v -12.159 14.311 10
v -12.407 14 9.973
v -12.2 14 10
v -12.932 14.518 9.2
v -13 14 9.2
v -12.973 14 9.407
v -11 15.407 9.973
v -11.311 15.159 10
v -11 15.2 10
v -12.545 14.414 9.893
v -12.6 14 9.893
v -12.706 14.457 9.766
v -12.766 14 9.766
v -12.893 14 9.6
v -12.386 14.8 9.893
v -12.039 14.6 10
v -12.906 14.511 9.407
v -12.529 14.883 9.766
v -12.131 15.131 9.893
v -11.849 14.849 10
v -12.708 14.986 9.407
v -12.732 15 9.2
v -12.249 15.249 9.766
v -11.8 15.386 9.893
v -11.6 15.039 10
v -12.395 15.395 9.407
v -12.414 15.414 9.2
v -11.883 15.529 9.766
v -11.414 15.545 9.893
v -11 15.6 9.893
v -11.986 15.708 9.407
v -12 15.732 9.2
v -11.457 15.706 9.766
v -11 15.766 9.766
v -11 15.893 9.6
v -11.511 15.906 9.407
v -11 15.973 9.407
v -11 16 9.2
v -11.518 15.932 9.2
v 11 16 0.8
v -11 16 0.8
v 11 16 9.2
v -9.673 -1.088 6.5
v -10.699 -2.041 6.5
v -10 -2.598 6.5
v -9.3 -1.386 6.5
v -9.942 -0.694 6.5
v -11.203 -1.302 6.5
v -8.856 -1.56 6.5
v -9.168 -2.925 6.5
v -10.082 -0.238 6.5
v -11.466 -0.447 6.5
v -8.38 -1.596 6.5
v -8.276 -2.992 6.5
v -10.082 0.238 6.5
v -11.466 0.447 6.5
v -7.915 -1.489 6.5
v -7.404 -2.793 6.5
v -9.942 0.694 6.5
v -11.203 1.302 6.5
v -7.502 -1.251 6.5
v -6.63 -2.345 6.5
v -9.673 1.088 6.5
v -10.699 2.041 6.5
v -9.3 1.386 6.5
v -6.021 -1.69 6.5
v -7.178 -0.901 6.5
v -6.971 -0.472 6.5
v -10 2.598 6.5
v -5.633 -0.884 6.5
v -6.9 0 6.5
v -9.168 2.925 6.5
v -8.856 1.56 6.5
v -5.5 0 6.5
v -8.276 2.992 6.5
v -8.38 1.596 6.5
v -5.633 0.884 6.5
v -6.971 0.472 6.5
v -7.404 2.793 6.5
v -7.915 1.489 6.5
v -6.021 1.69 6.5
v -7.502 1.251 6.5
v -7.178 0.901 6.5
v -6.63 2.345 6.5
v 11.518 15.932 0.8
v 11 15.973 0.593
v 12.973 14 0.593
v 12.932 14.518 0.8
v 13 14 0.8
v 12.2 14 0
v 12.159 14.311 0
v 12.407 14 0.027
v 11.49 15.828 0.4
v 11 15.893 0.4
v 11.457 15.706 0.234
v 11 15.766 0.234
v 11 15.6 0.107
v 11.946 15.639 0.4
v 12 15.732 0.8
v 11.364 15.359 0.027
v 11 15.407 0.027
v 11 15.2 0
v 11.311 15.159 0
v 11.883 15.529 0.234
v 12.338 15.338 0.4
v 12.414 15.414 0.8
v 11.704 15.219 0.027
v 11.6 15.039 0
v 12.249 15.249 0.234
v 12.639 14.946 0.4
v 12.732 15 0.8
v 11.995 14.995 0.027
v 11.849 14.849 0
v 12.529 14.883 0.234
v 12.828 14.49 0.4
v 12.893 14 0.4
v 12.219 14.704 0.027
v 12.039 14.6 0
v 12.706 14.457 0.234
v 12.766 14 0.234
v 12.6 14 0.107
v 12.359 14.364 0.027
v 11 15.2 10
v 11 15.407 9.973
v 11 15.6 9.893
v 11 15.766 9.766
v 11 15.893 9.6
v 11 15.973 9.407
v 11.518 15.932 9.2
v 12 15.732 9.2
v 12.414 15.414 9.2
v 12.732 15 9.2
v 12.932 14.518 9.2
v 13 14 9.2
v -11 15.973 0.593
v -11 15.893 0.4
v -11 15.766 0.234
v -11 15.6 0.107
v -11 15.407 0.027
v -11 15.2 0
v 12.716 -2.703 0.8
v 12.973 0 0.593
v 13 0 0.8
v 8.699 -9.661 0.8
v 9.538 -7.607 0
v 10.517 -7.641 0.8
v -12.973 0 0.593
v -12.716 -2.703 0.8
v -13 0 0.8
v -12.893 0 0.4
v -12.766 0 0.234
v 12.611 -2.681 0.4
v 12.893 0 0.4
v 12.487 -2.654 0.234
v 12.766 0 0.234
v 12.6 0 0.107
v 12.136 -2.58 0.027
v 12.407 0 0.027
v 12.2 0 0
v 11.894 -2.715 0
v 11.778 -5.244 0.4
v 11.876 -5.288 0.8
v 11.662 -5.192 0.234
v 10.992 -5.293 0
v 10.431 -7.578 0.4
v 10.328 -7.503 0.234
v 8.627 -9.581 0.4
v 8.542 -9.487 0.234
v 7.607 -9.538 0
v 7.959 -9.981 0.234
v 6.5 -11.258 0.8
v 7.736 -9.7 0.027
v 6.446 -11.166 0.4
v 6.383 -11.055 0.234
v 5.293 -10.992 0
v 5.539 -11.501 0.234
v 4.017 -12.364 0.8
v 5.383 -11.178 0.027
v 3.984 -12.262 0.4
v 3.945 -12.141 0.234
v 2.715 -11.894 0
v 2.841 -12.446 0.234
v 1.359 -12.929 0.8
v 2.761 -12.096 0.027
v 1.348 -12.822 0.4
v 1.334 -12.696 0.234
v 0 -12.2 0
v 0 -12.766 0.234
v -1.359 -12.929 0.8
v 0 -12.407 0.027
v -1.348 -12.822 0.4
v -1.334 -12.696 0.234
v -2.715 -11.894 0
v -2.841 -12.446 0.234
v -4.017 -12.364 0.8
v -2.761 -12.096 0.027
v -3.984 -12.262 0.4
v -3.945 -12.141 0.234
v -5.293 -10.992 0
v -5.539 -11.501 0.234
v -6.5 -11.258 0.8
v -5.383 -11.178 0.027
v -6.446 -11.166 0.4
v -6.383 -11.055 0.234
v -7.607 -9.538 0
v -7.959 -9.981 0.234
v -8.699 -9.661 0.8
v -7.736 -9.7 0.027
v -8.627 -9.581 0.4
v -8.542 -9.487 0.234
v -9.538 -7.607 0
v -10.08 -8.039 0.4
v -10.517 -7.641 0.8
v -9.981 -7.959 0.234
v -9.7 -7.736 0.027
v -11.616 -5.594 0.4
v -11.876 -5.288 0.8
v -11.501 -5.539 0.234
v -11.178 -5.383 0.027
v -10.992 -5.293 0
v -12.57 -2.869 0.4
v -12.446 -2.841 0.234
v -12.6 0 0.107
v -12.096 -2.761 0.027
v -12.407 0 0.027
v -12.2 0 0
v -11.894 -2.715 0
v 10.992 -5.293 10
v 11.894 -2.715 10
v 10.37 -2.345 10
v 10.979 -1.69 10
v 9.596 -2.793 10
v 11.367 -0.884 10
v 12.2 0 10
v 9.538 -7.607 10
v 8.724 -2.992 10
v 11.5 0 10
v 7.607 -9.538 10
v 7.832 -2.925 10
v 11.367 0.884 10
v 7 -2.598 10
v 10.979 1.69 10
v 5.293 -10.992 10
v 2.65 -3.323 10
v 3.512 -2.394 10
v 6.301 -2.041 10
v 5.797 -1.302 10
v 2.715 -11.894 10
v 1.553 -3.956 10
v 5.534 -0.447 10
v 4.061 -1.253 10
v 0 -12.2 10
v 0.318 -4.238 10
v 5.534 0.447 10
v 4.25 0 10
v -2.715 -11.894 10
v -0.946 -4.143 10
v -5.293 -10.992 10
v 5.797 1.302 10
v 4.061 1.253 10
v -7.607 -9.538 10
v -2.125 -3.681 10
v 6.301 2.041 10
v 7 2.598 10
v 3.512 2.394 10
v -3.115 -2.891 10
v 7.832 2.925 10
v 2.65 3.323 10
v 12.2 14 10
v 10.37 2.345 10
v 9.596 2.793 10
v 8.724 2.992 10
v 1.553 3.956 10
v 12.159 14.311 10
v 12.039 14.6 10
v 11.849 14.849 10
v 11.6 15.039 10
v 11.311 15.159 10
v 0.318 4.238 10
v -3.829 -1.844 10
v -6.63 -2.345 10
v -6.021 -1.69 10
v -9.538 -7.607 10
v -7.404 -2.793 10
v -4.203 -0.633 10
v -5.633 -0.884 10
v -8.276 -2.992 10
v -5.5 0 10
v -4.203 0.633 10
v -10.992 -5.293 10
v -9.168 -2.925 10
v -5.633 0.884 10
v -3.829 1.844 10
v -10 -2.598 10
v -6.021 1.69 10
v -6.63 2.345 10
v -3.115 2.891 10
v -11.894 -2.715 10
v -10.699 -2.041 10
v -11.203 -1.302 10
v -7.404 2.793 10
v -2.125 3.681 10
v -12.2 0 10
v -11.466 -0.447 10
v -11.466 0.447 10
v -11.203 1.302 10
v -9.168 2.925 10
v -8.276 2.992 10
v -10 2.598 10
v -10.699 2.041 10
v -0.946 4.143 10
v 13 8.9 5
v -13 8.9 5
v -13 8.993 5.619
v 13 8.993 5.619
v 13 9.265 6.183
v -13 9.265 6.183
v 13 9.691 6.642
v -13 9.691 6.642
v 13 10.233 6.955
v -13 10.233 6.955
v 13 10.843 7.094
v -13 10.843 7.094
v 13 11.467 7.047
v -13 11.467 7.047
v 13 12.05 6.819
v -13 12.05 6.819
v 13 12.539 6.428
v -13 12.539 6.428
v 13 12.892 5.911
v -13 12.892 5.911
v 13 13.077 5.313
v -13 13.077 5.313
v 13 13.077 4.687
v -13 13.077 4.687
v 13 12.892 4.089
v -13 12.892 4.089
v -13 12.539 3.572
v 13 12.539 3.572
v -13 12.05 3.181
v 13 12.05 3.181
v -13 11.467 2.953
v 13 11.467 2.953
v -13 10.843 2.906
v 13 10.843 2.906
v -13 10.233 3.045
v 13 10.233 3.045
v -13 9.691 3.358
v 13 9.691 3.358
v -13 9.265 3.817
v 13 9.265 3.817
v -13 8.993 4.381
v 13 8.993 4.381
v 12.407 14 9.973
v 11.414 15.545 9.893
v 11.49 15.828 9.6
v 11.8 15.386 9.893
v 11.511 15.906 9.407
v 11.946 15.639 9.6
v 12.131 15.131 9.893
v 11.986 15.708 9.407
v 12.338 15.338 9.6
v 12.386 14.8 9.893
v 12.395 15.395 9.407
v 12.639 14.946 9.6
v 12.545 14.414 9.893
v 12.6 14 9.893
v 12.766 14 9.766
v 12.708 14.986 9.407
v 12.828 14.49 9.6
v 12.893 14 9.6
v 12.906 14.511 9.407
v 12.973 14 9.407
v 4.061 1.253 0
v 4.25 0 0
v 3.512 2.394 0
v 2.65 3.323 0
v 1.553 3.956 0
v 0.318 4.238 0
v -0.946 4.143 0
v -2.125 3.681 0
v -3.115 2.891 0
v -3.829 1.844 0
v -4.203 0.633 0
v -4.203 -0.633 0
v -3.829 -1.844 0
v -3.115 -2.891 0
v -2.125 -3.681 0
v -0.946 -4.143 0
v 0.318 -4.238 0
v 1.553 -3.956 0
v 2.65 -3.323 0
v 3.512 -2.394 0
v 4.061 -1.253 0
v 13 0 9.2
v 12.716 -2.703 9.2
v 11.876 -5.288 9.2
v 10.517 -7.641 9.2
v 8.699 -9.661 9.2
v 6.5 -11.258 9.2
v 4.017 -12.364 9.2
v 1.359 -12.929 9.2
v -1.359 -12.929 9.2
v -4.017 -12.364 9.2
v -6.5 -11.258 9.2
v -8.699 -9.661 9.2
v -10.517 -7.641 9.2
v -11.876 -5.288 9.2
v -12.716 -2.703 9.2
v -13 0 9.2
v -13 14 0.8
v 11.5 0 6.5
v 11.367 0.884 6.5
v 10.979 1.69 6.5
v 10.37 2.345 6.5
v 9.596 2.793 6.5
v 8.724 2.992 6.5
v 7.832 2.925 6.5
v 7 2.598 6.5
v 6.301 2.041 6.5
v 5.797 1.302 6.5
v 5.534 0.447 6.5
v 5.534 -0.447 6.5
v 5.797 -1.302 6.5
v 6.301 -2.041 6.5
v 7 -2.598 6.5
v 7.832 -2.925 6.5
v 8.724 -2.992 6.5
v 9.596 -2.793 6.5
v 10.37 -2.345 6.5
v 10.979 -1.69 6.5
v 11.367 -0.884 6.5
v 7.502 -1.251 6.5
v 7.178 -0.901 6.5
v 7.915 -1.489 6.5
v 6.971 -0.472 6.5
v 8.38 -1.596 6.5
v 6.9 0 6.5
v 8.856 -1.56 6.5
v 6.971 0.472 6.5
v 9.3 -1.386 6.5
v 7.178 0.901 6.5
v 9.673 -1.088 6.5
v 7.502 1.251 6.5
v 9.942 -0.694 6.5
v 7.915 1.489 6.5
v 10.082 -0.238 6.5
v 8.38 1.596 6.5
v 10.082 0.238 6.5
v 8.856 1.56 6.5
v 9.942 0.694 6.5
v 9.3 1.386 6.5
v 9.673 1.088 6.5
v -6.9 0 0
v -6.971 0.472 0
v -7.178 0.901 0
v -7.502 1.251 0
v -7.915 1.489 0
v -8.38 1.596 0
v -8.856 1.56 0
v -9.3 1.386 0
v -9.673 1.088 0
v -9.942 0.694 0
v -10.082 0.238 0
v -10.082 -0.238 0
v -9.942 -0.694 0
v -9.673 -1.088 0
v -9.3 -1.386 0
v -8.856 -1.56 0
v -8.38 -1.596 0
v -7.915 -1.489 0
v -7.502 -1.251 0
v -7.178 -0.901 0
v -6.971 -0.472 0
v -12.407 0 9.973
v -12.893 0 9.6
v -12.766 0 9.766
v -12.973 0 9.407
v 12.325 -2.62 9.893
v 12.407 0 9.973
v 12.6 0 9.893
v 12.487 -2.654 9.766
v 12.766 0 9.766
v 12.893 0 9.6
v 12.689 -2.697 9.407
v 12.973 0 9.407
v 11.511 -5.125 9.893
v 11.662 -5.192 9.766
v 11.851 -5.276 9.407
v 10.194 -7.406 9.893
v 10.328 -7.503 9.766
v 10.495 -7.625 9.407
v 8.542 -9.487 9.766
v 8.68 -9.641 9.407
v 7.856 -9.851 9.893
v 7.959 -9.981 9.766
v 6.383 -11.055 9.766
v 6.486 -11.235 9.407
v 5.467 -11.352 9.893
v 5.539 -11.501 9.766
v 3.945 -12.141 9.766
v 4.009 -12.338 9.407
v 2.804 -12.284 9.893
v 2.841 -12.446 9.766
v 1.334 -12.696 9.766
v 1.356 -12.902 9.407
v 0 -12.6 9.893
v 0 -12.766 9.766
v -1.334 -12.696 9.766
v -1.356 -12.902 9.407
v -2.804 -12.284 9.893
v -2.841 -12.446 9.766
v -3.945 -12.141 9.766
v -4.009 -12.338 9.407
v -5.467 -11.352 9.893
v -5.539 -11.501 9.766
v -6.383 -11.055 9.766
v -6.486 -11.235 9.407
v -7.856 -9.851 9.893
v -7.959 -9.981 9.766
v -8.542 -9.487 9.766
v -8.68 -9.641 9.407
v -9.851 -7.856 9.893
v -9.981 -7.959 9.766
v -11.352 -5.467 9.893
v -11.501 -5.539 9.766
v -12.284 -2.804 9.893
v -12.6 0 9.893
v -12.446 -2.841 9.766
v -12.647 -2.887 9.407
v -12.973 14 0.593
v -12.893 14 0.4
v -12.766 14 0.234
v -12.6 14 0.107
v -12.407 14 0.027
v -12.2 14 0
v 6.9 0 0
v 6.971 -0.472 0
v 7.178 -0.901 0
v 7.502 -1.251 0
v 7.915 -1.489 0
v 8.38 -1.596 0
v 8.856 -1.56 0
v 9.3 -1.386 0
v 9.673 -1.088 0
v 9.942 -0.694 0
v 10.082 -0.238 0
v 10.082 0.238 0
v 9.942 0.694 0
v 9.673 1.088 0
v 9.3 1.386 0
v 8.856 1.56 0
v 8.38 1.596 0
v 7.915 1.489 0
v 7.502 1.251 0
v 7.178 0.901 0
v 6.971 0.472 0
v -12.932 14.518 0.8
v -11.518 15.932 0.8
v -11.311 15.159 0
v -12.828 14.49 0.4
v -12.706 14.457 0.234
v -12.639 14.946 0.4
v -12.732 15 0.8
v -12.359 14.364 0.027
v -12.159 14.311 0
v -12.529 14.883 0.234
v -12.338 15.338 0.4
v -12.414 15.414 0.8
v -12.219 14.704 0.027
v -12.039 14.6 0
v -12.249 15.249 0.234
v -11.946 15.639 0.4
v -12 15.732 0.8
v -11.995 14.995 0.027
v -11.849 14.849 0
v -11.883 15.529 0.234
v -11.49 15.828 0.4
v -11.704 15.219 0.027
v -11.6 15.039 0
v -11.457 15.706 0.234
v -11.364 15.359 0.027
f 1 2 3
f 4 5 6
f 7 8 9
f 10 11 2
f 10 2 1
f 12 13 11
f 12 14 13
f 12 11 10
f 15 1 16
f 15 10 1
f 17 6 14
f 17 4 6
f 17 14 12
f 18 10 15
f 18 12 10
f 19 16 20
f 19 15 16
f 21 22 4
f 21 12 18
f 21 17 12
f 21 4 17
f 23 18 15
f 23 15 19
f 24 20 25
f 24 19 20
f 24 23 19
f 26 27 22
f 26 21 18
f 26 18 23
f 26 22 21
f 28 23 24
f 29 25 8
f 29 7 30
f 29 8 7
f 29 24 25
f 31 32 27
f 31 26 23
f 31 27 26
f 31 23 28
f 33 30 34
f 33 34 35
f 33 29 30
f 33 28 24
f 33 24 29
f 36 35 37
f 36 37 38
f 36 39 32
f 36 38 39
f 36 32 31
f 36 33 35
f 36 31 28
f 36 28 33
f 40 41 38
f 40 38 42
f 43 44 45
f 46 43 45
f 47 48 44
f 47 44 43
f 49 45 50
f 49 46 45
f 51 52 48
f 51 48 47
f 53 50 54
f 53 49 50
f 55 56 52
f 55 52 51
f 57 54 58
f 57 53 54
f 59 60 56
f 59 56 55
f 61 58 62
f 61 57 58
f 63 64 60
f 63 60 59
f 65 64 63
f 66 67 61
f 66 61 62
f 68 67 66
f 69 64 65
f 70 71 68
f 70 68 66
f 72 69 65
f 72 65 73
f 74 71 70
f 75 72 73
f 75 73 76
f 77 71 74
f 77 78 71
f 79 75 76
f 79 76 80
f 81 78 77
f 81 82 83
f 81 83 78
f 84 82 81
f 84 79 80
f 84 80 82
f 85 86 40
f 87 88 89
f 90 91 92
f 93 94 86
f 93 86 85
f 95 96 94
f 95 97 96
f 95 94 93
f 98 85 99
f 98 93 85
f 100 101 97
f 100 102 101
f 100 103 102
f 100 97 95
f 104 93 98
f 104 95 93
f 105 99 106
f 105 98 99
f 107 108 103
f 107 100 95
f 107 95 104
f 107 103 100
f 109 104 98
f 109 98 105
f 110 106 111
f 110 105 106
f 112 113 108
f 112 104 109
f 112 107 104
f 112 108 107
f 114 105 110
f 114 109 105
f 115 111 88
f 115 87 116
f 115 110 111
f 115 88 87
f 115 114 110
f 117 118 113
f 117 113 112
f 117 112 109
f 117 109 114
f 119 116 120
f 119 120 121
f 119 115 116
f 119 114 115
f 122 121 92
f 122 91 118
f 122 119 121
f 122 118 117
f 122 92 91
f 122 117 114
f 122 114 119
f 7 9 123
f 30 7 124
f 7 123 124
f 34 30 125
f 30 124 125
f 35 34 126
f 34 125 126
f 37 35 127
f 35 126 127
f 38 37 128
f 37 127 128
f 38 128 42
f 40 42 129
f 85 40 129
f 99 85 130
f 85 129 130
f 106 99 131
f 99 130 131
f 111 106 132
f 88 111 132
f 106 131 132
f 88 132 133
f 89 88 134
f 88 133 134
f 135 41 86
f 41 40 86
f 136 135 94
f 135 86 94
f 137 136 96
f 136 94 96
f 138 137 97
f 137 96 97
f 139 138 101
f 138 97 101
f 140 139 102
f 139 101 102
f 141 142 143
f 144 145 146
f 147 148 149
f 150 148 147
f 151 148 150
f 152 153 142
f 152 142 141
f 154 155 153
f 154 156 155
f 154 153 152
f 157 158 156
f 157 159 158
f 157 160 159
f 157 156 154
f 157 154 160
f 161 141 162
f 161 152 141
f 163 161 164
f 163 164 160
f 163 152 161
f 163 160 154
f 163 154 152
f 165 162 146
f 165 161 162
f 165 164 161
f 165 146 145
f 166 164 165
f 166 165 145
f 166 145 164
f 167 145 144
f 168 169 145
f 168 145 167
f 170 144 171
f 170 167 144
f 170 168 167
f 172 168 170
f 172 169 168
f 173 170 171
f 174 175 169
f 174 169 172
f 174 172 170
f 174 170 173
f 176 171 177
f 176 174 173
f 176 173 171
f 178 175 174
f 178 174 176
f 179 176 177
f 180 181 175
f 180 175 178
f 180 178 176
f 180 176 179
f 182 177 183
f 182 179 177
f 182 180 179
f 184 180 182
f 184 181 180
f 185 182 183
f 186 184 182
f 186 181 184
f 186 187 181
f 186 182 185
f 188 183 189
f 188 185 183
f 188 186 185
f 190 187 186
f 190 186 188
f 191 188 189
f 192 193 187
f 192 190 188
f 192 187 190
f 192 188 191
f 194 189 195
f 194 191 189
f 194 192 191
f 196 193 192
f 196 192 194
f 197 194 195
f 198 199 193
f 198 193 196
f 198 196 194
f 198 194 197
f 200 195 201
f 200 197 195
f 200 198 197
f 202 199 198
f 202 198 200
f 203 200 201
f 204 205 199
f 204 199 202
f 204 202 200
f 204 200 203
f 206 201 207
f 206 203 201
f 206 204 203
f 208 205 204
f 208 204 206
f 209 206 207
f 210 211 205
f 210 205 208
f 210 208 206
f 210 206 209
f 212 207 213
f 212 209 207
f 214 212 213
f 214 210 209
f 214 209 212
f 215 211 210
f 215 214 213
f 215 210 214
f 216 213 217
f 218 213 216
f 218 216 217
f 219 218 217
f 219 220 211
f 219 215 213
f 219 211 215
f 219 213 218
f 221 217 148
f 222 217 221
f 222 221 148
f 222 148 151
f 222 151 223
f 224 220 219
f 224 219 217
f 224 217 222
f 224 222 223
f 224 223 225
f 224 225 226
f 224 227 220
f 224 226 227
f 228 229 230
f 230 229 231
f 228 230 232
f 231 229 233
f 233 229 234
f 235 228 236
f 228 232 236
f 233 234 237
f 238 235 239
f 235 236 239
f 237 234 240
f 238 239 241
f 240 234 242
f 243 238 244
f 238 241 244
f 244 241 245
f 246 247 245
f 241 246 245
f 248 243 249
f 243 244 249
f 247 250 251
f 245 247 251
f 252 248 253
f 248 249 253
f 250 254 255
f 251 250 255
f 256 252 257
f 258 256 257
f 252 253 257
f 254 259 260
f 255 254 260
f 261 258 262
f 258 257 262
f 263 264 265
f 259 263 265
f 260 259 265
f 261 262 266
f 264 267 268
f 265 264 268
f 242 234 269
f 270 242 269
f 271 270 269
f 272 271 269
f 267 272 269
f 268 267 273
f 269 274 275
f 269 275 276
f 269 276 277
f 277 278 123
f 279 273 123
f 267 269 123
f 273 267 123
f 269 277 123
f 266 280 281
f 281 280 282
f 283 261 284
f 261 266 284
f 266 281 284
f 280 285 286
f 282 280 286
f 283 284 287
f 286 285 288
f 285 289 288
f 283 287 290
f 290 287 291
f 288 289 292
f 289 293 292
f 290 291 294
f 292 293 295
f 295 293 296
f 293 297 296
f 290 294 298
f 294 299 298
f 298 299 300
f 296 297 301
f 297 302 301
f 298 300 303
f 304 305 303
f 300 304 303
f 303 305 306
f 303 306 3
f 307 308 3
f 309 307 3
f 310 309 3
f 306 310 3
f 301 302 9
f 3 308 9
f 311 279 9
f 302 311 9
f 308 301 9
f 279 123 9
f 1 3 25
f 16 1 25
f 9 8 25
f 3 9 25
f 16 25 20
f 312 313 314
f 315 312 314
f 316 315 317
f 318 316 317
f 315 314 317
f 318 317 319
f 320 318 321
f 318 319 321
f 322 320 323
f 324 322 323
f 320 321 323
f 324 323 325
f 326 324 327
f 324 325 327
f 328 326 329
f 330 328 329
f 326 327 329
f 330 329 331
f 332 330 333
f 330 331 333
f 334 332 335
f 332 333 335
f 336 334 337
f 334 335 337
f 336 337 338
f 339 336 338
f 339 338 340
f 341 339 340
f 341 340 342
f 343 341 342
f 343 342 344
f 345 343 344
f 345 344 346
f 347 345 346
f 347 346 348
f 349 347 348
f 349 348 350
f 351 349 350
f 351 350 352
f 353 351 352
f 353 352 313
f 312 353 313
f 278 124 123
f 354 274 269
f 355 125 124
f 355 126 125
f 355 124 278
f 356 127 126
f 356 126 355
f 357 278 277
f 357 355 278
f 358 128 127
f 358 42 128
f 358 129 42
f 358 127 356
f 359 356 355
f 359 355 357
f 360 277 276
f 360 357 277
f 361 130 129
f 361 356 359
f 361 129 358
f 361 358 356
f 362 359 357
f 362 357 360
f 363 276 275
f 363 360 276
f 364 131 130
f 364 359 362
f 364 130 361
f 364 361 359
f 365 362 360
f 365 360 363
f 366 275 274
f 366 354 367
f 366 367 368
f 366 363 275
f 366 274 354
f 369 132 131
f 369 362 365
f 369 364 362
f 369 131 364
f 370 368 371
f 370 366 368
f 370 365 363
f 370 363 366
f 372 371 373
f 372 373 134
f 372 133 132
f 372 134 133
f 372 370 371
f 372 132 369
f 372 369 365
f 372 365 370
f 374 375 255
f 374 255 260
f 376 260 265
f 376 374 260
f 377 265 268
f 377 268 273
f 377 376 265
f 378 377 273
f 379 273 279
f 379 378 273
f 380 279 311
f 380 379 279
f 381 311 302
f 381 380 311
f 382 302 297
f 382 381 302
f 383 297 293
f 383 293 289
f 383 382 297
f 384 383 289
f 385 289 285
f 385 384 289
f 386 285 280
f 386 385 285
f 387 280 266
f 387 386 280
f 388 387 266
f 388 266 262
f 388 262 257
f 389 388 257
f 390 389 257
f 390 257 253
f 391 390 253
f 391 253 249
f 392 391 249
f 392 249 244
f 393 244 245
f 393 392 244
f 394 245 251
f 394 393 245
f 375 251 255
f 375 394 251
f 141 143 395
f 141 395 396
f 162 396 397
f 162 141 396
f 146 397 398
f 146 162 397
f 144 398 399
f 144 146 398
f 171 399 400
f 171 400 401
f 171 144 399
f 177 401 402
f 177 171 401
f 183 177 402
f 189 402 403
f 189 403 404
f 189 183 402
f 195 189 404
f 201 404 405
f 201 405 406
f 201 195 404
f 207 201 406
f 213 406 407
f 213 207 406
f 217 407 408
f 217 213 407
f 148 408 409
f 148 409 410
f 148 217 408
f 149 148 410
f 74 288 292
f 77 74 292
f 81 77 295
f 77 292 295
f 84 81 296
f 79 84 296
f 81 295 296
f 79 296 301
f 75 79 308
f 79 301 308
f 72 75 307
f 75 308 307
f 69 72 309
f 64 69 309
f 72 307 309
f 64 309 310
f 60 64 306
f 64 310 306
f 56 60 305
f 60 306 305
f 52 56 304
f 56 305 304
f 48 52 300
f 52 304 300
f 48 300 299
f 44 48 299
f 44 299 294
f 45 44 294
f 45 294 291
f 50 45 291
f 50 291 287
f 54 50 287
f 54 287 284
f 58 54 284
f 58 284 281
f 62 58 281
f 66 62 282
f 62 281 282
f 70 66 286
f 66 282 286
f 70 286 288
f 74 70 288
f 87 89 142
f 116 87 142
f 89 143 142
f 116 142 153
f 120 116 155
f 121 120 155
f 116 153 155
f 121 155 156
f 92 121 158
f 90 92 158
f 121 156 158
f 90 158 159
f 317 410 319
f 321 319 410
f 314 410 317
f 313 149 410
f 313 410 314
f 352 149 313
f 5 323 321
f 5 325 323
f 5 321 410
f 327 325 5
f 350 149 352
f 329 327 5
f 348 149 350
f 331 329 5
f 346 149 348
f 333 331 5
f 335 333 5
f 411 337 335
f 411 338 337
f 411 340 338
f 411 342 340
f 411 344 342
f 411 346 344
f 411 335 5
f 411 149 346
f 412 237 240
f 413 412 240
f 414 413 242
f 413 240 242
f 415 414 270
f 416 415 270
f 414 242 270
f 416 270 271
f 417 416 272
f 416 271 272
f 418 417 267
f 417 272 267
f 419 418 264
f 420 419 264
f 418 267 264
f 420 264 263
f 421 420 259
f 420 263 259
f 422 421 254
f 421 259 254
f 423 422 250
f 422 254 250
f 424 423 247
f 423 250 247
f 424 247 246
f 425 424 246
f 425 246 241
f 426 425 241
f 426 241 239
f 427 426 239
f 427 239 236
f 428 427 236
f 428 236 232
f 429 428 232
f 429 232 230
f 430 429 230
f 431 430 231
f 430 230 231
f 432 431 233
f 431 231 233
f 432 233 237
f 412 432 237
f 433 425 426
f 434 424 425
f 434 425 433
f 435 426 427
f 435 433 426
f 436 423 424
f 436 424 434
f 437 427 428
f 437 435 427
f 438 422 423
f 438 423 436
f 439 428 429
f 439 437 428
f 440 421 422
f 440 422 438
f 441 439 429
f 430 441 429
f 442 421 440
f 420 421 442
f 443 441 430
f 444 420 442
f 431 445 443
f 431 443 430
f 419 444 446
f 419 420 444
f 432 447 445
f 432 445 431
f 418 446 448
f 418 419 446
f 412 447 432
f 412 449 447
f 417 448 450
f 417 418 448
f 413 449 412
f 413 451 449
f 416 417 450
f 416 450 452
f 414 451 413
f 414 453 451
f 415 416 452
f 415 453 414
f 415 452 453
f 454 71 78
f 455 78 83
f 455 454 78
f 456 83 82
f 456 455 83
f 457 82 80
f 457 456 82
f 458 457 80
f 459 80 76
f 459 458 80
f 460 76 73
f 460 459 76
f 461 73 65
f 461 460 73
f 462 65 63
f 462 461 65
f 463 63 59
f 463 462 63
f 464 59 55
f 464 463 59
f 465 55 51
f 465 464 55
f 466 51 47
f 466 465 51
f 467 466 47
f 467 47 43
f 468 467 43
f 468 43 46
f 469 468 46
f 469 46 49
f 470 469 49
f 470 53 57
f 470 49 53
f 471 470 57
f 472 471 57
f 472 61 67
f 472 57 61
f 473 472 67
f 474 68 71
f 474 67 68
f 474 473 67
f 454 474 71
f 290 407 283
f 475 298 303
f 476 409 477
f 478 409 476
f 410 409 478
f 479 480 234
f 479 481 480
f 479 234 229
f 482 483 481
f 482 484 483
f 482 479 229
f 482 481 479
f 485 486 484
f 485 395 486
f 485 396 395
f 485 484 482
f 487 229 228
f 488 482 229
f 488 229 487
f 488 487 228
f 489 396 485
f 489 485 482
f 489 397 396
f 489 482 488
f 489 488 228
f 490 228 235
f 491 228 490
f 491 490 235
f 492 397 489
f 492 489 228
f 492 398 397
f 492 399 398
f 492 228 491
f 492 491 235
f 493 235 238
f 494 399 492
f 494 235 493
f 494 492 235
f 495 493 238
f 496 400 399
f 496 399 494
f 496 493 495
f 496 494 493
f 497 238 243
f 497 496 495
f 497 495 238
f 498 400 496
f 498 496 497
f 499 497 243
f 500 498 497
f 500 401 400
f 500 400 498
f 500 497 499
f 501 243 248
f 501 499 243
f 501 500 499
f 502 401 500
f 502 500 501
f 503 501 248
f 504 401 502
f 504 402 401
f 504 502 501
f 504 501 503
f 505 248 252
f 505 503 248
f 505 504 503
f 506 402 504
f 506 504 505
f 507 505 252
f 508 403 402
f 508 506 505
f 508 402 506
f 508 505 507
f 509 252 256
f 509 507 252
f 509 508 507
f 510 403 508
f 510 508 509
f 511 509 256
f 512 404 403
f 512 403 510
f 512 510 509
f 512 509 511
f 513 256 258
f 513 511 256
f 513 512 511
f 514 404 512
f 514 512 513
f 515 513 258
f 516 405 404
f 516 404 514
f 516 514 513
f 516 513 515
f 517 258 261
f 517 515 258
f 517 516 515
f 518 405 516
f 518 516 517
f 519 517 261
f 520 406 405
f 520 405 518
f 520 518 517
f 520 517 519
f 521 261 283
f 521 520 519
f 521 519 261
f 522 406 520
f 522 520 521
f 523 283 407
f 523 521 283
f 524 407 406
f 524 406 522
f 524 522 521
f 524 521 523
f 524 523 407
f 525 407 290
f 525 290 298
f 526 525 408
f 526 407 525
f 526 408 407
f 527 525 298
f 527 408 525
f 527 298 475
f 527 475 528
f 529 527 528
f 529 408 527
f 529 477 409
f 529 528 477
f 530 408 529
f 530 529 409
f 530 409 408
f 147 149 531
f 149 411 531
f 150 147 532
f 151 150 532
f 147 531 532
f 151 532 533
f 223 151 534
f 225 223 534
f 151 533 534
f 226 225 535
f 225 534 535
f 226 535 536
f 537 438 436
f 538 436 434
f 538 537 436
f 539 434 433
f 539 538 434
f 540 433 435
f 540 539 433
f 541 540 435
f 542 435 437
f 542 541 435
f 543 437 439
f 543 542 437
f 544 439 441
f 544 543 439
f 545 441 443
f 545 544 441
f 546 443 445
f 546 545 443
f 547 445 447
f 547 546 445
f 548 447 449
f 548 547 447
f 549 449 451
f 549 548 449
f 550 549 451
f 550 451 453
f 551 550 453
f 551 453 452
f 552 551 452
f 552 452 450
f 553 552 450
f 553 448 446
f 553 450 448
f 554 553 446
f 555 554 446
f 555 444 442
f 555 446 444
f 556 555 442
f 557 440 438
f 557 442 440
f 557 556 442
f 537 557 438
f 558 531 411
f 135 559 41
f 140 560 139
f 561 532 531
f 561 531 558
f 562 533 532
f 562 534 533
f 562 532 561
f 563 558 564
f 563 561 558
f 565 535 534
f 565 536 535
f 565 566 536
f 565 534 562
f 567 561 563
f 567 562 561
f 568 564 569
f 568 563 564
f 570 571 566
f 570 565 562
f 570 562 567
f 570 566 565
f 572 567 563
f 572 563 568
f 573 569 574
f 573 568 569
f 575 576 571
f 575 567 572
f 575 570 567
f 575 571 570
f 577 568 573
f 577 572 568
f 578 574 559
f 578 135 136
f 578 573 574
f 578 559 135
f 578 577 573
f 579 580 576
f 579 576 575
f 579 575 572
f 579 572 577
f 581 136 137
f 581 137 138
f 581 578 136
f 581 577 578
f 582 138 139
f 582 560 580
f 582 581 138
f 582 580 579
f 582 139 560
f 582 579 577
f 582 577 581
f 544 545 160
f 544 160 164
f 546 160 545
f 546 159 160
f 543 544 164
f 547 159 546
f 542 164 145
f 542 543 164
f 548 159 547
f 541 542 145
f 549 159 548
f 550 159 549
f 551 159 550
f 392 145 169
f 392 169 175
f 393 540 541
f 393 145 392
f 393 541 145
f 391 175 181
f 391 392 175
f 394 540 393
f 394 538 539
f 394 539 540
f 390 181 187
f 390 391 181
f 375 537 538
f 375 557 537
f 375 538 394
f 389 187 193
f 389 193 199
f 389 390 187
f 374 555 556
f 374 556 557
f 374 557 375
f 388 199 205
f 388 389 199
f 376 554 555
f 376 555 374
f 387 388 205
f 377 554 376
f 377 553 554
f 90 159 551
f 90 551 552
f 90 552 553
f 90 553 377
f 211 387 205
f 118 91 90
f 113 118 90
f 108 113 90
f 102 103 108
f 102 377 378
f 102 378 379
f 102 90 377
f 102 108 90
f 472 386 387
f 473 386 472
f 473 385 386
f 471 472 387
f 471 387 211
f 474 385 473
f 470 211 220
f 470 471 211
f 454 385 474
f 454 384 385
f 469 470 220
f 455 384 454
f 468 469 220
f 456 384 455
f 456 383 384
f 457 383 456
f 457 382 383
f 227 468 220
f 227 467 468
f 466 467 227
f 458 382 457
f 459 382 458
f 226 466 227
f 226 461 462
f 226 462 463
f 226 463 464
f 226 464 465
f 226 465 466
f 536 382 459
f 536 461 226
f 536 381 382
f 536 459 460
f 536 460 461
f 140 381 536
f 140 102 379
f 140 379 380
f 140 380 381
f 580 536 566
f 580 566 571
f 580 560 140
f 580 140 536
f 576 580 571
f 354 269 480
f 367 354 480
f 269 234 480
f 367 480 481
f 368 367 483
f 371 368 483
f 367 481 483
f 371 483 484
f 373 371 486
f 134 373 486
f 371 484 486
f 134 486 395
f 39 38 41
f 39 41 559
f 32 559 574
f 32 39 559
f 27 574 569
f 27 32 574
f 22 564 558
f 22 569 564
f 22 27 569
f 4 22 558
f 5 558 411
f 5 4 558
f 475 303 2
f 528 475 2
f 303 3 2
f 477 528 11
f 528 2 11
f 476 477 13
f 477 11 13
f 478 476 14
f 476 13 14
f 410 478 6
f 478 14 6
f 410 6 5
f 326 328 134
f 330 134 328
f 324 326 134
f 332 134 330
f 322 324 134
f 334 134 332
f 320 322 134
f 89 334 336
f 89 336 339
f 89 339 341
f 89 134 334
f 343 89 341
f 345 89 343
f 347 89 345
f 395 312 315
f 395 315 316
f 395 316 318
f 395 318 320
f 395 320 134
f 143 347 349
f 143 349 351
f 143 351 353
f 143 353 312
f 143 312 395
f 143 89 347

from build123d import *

# Parameters (mm, degrees)
ESQUISSE1_R             = 1.6
ESQUISSE1_R_2           = 4.25
BOSS_EXTRU_1_DEPTH      = 10
ESQUISSE2_R             = 3
ENL_V_MAT_EXTRU_1_DEPTH = 3.5
ESQUISSE3_R             = 2.1
ENL_V_MAT_EXTRU_2_DEPTH = 33.124756808
CONG_1_R                = 2
CONG_2_R                = 0.8


with BuildPart() as part:
    # Esquisse1 → Boss.-Extru.1 (new body)
    with BuildSketch(Plane.XY):
        with BuildLine():
            Line((-13, 16), (13, 16))
            Line((13, 16), (13, 0))
            ThreePointArc((13, 0), (0, -13), (-13, 0))
            Line((-13, 0), (-13, 16))
        make_face()
        with Locations((-8.5, 0)):
            Circle(ESQUISSE1_R, mode=Mode.SUBTRACT)
        with Locations(Location((8.5, 0, 0), (0, 0, 180))):
            Circle(ESQUISSE1_R, mode=Mode.SUBTRACT)
        Circle(ESQUISSE1_R_2, mode=Mode.SUBTRACT)
    extrude(amount=BOSS_EXTRU_1_DEPTH)

    # Esquisse2 → Enlèv. mat.-Extru.1 (cut)
    with BuildSketch(Plane.XY.offset(10)):
        with Locations((-8.5, 0)):
            Circle(ESQUISSE2_R)
        with Locations((8.5, 0)):
            Circle(ESQUISSE2_R)
    extrude(amount=-ENL_V_MAT_EXTRU_1_DEPTH, mode=Mode.SUBTRACT)

    # Esquisse3 → Enlèv. mat.-Extru.2 (cut, through all)
    with BuildSketch(Plane.ZY.offset(13)):
        with Locations(Location((5, 11, 0), (0, 0, 270))):
            Circle(ESQUISSE3_R)
    extrude(amount=-ENL_V_MAT_EXTRU_2_DEPTH, mode=Mode.SUBTRACT)

    # Congé1
    cong_1_edges = [part.edges().sort_by_distance(p)[0] for p in [
        (-13, 16, 5),
        (13, 16, 5),
    ]]
    fillet(cong_1_edges, radius=CONG_1_R)

    # Congé2
    cong_2_edges = [part.edges().sort_by_distance(p)[0] for p in [
        (13, 7, 10),
        (0, 16, 0),
        (0, 16, 10),
        (-13, 7, 0),
        (-12.414213562, 15.414213562, 0),
        (12.414213562, 15.414213562, 0),
        (-13, 7, 10),
        (-12.414213562, 15.414213562, 10),
        (12.414213562, 15.414213562, 10),
        (13, 7, 0),
        (0, -13, 0),
        (0, -13, 10),
    ]]
    fillet(cong_2_edges, radius=CONG_2_R)


solid = part.part
